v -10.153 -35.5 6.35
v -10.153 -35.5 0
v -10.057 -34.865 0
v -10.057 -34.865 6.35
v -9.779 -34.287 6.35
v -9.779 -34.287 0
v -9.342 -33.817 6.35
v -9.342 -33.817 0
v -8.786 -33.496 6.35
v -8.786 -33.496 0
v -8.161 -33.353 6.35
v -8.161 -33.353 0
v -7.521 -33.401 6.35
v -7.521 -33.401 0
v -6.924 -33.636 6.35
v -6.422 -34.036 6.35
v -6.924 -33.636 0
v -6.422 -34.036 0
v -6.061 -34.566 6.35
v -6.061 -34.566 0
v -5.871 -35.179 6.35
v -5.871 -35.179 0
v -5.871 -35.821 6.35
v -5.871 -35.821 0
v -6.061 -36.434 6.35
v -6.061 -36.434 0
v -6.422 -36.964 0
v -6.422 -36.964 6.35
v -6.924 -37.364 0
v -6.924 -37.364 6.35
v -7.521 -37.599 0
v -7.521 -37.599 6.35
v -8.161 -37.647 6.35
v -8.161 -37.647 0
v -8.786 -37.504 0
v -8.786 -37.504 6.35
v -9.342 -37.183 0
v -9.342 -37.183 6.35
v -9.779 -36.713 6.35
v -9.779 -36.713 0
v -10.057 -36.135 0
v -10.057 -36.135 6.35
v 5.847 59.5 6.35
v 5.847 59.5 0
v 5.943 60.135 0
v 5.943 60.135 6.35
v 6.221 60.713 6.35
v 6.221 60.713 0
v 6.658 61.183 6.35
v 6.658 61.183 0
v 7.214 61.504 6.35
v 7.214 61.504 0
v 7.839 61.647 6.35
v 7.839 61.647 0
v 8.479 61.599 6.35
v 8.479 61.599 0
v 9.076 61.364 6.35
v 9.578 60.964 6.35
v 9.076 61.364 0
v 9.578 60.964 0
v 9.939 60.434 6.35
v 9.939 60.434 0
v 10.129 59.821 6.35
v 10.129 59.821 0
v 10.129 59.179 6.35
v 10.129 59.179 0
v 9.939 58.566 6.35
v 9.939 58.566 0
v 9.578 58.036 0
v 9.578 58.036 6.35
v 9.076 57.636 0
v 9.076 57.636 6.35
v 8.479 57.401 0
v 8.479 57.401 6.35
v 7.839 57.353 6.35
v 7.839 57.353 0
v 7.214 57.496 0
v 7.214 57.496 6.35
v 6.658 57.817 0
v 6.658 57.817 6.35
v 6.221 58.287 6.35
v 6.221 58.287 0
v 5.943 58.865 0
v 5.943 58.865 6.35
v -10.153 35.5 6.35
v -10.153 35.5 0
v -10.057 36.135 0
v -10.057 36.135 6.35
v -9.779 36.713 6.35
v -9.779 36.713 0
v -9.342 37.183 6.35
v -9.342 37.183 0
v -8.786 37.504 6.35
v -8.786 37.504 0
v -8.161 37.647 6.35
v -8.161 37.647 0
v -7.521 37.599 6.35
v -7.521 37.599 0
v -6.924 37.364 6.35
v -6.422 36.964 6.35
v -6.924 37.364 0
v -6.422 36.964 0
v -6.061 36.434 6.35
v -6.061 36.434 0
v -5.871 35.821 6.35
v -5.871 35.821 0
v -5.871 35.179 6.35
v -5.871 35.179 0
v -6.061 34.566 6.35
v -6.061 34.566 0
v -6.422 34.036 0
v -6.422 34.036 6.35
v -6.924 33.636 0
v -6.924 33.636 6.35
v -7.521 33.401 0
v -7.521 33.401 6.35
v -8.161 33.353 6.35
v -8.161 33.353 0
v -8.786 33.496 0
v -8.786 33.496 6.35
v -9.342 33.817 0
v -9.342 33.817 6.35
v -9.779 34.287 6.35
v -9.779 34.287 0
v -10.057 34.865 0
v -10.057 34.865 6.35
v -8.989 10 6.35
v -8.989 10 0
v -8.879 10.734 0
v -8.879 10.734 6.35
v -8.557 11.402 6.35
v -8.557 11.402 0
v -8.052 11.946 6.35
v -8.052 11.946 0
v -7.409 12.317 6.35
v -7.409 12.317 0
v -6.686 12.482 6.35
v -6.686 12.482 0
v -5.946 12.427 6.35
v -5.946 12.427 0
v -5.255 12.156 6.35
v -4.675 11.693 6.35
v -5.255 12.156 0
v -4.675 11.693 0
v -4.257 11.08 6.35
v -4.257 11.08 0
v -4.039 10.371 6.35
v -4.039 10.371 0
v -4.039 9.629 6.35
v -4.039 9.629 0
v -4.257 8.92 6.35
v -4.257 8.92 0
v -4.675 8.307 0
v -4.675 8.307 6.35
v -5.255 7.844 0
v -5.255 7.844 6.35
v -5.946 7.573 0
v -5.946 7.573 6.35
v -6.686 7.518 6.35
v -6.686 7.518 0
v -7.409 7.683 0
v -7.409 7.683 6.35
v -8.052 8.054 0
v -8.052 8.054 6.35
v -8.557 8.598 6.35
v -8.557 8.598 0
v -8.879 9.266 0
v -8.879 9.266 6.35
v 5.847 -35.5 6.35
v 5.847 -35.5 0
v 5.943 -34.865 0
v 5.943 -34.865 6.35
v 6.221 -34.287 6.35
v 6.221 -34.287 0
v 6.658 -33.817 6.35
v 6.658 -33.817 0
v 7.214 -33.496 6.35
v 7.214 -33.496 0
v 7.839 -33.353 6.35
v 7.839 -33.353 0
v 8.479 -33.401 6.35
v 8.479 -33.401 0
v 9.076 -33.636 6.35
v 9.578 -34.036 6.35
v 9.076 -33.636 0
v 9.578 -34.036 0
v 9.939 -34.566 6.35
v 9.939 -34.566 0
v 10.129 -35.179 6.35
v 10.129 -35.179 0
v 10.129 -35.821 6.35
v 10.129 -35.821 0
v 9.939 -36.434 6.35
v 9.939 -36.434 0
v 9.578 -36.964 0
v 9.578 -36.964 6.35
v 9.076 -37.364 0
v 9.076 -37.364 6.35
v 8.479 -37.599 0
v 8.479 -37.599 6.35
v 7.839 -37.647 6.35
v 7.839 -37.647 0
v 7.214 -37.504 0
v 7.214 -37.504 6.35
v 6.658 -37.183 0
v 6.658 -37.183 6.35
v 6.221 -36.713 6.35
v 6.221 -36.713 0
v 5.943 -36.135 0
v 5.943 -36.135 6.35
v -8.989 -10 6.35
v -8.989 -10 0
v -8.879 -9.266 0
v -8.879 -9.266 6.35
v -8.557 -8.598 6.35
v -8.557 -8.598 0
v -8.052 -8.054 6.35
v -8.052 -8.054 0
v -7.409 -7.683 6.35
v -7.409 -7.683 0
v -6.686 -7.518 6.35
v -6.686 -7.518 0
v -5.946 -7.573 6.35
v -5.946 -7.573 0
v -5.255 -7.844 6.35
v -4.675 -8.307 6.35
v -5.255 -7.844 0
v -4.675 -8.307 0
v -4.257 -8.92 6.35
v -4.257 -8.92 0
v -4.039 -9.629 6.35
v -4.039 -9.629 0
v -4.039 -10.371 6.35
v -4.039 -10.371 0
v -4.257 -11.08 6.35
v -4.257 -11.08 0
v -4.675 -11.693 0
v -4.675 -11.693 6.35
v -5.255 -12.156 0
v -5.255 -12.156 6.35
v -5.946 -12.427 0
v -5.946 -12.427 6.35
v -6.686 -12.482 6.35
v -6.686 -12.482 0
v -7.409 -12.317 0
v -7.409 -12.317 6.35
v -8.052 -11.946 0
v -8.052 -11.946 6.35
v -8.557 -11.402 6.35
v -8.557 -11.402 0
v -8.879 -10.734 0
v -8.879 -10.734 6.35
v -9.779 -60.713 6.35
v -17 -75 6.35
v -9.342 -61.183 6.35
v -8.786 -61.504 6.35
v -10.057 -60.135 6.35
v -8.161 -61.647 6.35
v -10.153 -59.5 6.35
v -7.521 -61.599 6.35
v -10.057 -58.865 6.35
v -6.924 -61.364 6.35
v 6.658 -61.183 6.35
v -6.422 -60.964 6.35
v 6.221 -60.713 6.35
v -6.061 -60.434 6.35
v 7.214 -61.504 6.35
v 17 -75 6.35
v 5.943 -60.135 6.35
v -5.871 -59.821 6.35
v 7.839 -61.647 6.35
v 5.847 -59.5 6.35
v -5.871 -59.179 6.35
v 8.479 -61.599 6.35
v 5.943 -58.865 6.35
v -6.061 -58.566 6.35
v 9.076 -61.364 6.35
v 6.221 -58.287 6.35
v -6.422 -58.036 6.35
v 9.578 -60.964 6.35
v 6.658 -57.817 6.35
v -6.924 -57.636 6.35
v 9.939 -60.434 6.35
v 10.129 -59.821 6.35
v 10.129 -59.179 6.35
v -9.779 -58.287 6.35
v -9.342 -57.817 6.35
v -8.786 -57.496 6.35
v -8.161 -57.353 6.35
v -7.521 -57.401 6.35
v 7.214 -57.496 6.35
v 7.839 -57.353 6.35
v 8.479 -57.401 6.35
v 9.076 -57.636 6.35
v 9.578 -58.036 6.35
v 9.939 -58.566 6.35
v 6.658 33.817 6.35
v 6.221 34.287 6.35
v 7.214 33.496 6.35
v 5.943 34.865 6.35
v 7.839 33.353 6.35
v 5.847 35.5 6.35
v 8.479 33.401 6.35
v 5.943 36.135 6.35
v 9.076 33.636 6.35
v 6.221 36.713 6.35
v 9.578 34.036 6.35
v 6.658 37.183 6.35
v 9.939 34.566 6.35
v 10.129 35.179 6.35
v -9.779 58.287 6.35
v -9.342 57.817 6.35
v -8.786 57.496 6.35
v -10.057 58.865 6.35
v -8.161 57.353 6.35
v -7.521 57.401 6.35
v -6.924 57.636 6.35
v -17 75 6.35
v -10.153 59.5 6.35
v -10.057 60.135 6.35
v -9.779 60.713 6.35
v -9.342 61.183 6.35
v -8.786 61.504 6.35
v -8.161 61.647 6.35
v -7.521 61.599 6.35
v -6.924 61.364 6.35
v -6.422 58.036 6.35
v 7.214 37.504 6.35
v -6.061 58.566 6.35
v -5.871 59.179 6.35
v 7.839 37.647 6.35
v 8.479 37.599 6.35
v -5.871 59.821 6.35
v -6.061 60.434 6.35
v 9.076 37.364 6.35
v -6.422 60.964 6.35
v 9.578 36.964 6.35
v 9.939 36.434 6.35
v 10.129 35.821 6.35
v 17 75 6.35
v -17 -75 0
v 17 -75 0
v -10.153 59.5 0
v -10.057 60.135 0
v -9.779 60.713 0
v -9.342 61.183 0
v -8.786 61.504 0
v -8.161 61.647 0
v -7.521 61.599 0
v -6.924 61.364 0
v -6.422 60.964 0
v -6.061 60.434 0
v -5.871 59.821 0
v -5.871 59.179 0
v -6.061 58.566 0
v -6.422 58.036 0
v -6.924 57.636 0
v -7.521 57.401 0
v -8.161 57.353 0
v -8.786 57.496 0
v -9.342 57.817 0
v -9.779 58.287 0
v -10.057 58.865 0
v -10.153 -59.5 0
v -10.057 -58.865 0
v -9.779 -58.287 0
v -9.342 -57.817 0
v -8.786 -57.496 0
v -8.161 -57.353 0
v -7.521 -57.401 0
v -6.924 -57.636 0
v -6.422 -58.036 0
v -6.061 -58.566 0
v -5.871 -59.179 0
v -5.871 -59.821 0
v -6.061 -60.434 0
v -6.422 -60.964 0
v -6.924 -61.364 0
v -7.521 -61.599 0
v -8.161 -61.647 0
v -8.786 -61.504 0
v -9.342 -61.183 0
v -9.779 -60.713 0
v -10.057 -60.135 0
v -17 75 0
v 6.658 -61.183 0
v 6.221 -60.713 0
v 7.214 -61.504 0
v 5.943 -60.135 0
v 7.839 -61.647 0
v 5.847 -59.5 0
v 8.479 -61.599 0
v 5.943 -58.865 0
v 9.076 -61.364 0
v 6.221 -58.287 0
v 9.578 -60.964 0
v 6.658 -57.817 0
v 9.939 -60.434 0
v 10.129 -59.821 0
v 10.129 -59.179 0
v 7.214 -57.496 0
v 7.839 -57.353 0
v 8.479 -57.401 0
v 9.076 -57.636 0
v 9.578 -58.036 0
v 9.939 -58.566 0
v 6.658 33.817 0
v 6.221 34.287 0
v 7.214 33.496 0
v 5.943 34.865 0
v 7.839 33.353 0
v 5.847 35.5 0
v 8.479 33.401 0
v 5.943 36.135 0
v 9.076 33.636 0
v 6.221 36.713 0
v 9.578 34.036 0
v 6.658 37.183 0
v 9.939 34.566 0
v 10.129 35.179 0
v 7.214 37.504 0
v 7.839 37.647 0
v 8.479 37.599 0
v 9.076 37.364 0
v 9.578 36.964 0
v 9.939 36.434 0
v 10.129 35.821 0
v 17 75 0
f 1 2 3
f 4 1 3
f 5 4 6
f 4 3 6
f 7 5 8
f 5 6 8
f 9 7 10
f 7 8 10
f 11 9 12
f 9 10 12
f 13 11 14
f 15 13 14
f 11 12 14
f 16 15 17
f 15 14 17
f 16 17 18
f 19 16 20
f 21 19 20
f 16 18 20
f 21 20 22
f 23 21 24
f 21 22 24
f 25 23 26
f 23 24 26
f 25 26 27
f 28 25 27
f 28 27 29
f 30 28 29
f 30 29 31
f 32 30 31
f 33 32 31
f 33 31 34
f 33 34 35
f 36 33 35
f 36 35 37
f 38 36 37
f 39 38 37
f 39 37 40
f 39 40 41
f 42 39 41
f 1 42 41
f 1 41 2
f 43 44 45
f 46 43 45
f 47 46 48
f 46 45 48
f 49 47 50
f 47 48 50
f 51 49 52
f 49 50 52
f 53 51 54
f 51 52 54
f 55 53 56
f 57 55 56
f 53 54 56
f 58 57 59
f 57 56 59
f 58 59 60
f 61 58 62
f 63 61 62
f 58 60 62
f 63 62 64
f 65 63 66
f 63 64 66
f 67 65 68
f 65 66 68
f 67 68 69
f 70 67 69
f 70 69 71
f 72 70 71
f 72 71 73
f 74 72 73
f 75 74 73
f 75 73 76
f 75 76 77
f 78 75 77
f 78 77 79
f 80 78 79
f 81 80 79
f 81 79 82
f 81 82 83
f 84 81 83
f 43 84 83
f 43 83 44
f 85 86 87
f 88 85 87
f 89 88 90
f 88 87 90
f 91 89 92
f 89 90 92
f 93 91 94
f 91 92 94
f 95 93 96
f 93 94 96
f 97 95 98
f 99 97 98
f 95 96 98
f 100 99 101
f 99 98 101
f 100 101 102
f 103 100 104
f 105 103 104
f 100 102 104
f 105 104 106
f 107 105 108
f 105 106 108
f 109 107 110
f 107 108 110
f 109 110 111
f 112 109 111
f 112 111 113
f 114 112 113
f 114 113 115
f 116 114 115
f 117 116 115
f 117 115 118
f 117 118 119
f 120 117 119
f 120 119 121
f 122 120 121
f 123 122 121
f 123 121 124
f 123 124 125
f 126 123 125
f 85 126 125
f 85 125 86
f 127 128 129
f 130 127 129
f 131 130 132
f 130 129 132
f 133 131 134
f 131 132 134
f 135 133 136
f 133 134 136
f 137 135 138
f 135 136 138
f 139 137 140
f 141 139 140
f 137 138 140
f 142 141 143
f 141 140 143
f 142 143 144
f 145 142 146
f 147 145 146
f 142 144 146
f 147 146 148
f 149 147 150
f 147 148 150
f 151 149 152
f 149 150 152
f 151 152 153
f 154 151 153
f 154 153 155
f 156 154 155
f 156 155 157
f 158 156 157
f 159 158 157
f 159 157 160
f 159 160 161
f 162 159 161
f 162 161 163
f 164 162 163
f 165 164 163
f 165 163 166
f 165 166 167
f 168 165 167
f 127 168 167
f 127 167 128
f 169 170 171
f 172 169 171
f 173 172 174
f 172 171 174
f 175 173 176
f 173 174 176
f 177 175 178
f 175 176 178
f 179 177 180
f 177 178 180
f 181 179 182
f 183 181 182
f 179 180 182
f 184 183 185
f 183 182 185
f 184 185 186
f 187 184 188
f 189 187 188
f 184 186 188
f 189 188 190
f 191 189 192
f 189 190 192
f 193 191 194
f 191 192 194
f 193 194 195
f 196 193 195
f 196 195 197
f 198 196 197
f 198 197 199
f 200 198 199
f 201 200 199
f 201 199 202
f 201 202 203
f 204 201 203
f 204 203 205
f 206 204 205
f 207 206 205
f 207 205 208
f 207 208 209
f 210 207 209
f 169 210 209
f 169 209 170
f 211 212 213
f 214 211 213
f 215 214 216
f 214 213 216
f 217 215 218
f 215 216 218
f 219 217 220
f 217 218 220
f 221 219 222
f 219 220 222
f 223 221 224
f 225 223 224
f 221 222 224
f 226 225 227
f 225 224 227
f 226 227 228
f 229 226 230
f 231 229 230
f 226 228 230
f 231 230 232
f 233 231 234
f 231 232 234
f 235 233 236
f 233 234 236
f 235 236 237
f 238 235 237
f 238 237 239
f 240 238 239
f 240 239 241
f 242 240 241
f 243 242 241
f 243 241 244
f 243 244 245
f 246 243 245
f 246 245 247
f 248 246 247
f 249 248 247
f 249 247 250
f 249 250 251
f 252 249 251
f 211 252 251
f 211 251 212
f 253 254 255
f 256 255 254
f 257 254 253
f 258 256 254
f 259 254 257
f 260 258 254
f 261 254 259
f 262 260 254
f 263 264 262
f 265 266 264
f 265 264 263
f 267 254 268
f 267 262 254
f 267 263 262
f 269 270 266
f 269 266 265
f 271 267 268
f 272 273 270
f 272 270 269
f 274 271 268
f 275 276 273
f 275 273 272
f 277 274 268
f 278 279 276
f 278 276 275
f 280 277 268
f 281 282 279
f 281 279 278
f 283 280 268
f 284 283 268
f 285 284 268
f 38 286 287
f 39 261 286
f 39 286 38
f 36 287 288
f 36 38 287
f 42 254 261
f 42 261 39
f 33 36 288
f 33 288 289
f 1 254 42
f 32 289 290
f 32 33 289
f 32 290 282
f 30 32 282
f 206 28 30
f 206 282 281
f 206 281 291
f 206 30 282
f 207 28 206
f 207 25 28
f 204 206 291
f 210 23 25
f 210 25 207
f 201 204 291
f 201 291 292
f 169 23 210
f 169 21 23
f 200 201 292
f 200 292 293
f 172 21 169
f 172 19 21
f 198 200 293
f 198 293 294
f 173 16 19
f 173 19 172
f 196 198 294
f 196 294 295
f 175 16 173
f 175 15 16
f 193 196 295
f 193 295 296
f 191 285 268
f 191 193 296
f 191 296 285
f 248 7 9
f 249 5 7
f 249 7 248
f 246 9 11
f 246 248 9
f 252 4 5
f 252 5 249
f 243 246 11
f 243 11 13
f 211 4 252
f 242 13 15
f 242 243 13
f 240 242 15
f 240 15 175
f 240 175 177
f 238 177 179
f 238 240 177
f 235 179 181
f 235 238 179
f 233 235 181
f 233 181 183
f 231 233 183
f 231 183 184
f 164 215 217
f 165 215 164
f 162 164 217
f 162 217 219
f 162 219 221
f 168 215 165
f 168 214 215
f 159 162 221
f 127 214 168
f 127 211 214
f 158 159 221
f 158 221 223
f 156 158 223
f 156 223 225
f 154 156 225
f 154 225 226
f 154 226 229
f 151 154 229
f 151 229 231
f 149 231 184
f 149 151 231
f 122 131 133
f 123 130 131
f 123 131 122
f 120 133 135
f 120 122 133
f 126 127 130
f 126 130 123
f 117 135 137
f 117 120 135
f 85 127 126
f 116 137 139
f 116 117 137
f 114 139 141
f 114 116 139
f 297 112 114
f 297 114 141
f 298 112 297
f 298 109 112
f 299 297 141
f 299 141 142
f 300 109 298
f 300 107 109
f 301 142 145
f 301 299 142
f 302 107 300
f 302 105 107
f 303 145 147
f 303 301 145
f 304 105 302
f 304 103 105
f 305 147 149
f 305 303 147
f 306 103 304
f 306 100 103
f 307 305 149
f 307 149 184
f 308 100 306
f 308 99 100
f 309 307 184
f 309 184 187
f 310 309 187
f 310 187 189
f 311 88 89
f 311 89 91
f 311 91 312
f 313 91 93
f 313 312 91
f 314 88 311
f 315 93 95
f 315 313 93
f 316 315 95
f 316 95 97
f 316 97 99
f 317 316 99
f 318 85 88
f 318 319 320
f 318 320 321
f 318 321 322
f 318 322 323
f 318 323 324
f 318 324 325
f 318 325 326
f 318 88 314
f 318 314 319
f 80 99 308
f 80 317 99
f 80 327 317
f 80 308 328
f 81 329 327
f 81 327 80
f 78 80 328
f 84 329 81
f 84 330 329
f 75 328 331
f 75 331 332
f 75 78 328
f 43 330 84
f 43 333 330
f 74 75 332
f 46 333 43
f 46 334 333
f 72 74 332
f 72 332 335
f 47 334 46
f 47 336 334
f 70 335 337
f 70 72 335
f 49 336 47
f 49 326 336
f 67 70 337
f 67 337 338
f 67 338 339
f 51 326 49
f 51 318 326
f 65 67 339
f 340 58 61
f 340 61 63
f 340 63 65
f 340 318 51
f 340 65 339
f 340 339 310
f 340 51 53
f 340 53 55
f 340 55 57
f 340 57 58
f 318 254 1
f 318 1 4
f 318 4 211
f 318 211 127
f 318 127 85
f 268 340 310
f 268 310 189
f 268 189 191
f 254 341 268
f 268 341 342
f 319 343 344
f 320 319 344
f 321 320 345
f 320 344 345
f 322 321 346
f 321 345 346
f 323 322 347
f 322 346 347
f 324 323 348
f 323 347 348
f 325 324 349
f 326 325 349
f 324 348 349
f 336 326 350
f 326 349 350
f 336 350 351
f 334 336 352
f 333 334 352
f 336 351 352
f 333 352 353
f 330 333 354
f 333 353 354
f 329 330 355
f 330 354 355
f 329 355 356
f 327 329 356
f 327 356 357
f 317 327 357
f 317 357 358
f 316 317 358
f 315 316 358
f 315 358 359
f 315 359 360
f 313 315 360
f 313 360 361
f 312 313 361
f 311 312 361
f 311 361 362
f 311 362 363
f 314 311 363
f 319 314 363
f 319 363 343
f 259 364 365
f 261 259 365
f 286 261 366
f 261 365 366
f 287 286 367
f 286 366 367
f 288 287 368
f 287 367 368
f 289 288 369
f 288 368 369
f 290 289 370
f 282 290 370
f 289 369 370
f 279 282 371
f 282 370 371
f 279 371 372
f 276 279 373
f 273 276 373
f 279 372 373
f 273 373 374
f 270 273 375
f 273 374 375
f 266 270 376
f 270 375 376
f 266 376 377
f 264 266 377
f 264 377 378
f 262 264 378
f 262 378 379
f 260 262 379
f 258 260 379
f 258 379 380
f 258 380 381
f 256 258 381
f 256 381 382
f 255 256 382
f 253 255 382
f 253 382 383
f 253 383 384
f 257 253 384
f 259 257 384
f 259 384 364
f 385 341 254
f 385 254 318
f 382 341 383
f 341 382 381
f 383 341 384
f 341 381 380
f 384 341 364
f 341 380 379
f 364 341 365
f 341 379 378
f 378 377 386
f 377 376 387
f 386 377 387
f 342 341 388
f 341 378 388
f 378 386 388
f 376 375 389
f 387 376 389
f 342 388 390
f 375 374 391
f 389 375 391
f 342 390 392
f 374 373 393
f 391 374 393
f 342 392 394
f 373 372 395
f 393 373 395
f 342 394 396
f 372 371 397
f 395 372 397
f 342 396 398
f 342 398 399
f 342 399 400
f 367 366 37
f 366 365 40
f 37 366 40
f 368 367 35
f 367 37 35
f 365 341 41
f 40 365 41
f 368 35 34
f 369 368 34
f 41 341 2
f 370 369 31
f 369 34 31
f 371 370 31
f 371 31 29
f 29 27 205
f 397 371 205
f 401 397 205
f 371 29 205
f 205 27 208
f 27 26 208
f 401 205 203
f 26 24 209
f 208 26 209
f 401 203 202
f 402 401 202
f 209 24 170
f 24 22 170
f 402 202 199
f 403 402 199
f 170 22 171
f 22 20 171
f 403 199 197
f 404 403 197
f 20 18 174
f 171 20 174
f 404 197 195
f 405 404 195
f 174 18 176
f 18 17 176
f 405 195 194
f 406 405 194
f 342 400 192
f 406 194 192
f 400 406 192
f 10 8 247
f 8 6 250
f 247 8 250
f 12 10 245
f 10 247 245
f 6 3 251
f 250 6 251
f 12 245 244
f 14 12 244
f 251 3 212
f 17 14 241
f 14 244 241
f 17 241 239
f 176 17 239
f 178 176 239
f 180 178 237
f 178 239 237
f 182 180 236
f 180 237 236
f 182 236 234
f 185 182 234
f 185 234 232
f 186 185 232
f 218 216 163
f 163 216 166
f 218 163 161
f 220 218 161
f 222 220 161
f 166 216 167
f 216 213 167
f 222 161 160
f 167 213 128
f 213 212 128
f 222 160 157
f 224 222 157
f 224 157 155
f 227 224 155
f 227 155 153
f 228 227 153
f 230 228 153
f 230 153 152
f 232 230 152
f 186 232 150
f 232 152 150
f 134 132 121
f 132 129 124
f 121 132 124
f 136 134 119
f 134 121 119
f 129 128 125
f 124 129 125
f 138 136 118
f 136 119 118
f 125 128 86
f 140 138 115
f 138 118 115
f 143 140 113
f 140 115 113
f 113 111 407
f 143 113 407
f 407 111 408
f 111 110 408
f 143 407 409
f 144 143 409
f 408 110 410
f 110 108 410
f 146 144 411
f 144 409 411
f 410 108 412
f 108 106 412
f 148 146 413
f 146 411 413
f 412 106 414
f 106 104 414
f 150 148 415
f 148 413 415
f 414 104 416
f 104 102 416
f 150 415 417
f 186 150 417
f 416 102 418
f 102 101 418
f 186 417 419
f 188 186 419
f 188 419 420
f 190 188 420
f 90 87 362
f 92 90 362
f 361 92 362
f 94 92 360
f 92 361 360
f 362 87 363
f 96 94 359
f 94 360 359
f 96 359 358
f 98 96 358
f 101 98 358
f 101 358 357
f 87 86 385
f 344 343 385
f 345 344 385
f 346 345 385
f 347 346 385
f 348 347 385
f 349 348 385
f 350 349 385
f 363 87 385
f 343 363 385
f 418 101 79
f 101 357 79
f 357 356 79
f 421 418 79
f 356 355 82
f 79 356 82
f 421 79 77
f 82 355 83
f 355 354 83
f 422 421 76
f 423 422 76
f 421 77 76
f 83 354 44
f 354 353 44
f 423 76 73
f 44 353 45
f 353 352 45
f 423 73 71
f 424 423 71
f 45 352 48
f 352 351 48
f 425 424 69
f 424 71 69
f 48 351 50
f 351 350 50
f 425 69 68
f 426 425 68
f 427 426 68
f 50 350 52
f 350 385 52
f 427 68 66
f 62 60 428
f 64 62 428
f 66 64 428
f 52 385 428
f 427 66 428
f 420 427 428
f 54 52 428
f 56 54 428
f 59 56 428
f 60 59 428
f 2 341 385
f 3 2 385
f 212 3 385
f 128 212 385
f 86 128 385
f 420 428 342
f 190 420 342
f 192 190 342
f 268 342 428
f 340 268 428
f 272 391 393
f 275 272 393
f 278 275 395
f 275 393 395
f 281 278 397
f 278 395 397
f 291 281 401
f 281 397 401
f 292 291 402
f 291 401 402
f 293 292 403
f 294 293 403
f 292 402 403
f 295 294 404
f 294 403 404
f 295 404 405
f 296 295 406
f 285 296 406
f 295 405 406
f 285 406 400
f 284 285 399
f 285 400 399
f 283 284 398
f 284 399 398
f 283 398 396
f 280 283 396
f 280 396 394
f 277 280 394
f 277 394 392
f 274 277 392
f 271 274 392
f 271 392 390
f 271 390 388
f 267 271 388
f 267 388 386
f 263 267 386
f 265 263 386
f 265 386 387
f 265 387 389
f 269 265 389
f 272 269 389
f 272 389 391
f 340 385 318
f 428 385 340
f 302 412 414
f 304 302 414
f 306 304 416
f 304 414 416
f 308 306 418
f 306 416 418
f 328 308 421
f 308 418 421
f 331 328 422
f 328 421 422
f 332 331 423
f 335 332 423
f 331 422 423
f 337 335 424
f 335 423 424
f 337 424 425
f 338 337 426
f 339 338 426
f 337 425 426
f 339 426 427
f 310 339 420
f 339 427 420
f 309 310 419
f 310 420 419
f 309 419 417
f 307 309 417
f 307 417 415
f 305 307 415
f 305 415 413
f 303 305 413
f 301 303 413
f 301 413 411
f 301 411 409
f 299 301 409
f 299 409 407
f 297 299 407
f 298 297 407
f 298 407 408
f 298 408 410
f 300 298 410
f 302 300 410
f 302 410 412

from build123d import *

# Parameters (mm, degrees)
SKETCH1_W              = 34
SKETCH1_H              = 150
BOSS_EXTRUDE1_DEPTH    = 6.35
F_8_CLEARANCE_HOLE1_D  = 4.3053
F_10_CLEARANCE_HOLE1_D = 4.9784


with BuildPart() as part:
    # Sketch1 → Boss-Extrude1 (new body)
    with BuildSketch(Plane.XY):
        Rectangle(SKETCH1_W, SKETCH1_H)
    extrude(amount=BOSS_EXTRUDE1_DEPTH)

    # #8 Clearance Hole1 (through all)
    with Locations(Plane.XY.offset(6.35)):
        with Locations((-8, 59.5), (8, 59.5), (8, 35.5), (-8, 35.5), (-8, -35.5), (-8, -59.5), (8, -59.5), (8, -35.5)):
            Hole(F_8_CLEARANCE_HOLE1_D / 2)

    # #10 Clearance Hole1 (through all)
    with Locations(Plane.XY.offset(6.35)):
        with Locations((-6.5, 10), (-6.5, -10)):
            Hole(F_10_CLEARANCE_HOLE1_D / 2)


solid = part.part
